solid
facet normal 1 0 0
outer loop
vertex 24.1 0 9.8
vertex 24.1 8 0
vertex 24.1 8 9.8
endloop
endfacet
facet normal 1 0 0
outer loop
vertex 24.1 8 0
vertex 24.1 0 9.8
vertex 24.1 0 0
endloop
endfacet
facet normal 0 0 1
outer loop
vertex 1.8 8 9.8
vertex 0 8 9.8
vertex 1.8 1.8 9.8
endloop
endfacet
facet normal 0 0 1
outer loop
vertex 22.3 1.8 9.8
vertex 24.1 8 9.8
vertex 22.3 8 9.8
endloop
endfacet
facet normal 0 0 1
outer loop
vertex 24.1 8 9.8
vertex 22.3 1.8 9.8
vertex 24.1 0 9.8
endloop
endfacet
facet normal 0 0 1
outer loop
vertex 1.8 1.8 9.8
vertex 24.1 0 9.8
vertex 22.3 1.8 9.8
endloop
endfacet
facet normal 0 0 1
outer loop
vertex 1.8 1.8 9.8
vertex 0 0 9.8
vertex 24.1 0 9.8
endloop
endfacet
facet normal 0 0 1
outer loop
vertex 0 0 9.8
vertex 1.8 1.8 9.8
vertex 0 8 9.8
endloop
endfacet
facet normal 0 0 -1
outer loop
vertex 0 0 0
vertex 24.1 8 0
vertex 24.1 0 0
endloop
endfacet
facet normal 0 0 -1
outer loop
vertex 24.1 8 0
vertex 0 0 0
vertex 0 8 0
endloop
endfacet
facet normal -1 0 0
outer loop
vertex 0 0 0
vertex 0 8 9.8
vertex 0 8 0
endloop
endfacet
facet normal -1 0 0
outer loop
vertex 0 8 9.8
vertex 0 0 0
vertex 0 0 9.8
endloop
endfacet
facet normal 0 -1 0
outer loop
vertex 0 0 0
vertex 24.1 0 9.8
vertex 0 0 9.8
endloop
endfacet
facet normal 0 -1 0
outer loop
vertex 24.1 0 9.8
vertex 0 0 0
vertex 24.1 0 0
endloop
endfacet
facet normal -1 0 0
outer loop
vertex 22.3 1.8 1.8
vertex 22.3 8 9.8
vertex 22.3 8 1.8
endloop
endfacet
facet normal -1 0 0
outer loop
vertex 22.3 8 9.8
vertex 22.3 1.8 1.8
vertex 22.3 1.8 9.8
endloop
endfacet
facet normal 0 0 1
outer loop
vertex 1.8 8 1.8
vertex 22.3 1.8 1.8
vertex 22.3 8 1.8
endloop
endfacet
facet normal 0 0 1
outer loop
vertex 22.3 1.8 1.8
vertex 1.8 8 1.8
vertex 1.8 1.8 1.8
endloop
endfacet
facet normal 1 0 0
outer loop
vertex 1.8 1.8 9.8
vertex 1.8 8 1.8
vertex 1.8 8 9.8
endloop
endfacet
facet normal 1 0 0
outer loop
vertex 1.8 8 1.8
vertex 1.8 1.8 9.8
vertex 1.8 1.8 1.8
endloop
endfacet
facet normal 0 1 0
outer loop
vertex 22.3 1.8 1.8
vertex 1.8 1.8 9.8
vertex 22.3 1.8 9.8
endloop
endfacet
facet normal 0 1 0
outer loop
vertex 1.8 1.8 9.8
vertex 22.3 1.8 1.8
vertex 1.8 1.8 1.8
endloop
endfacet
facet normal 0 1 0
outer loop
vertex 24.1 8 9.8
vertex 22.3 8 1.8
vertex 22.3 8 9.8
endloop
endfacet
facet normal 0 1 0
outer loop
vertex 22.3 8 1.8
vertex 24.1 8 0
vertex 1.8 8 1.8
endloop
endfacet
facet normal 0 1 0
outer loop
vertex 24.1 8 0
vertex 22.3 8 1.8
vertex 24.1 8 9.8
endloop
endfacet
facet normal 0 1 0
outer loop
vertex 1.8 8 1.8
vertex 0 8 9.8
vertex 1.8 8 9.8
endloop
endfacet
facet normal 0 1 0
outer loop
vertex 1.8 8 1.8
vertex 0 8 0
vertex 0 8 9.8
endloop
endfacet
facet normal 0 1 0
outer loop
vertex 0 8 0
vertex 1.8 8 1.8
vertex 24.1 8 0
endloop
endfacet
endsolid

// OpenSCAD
// Portable functional FDM part template.
// Units: millimeters. Intended print face: Z = 0.

$fn = 96;
part = "test"; // [test,part]

nominal_width = 20;
nominal_depth = 12;
nominal_height = 8;
sliding_clearance = 0.25;
press_interference = 0.10;
wall = 1.8;
epsilon = 0.02; // Positive Boolean overlap. Do not use this as fit clearance.

assert(wall > 0, "wall must be positive");
assert(sliding_clearance >= 0, "sliding_clearance must not be negative");

module hardware_envelope(clearance = 0) {
  cube([
    nominal_width + 2 * clearance,
    nominal_depth + 2 * clearance,
    nominal_height + clearance
  ]);
}

module functional_part() {
  difference() {
    cube([
      nominal_width + 2 * (wall + sliding_clearance),
      nominal_depth + 2 * (wall + sliding_clearance),
      nominal_height + wall
    ]);
    translate([wall, wall, wall])
      hardware_envelope(sliding_clearance);
  }
}

module fit_test() {
  coupon_depth = min(nominal_depth, 8);
  intersection() {
    functional_part();
    cube([nominal_width + 2 * (wall + sliding_clearance), coupon_depth, nominal_height + wall]);
  }
}

if (part == "test") {
  fit_test();
} else if (part == "part") {
  functional_part();
} else {
  assert(false, str("Unknown part: ", part));
}
